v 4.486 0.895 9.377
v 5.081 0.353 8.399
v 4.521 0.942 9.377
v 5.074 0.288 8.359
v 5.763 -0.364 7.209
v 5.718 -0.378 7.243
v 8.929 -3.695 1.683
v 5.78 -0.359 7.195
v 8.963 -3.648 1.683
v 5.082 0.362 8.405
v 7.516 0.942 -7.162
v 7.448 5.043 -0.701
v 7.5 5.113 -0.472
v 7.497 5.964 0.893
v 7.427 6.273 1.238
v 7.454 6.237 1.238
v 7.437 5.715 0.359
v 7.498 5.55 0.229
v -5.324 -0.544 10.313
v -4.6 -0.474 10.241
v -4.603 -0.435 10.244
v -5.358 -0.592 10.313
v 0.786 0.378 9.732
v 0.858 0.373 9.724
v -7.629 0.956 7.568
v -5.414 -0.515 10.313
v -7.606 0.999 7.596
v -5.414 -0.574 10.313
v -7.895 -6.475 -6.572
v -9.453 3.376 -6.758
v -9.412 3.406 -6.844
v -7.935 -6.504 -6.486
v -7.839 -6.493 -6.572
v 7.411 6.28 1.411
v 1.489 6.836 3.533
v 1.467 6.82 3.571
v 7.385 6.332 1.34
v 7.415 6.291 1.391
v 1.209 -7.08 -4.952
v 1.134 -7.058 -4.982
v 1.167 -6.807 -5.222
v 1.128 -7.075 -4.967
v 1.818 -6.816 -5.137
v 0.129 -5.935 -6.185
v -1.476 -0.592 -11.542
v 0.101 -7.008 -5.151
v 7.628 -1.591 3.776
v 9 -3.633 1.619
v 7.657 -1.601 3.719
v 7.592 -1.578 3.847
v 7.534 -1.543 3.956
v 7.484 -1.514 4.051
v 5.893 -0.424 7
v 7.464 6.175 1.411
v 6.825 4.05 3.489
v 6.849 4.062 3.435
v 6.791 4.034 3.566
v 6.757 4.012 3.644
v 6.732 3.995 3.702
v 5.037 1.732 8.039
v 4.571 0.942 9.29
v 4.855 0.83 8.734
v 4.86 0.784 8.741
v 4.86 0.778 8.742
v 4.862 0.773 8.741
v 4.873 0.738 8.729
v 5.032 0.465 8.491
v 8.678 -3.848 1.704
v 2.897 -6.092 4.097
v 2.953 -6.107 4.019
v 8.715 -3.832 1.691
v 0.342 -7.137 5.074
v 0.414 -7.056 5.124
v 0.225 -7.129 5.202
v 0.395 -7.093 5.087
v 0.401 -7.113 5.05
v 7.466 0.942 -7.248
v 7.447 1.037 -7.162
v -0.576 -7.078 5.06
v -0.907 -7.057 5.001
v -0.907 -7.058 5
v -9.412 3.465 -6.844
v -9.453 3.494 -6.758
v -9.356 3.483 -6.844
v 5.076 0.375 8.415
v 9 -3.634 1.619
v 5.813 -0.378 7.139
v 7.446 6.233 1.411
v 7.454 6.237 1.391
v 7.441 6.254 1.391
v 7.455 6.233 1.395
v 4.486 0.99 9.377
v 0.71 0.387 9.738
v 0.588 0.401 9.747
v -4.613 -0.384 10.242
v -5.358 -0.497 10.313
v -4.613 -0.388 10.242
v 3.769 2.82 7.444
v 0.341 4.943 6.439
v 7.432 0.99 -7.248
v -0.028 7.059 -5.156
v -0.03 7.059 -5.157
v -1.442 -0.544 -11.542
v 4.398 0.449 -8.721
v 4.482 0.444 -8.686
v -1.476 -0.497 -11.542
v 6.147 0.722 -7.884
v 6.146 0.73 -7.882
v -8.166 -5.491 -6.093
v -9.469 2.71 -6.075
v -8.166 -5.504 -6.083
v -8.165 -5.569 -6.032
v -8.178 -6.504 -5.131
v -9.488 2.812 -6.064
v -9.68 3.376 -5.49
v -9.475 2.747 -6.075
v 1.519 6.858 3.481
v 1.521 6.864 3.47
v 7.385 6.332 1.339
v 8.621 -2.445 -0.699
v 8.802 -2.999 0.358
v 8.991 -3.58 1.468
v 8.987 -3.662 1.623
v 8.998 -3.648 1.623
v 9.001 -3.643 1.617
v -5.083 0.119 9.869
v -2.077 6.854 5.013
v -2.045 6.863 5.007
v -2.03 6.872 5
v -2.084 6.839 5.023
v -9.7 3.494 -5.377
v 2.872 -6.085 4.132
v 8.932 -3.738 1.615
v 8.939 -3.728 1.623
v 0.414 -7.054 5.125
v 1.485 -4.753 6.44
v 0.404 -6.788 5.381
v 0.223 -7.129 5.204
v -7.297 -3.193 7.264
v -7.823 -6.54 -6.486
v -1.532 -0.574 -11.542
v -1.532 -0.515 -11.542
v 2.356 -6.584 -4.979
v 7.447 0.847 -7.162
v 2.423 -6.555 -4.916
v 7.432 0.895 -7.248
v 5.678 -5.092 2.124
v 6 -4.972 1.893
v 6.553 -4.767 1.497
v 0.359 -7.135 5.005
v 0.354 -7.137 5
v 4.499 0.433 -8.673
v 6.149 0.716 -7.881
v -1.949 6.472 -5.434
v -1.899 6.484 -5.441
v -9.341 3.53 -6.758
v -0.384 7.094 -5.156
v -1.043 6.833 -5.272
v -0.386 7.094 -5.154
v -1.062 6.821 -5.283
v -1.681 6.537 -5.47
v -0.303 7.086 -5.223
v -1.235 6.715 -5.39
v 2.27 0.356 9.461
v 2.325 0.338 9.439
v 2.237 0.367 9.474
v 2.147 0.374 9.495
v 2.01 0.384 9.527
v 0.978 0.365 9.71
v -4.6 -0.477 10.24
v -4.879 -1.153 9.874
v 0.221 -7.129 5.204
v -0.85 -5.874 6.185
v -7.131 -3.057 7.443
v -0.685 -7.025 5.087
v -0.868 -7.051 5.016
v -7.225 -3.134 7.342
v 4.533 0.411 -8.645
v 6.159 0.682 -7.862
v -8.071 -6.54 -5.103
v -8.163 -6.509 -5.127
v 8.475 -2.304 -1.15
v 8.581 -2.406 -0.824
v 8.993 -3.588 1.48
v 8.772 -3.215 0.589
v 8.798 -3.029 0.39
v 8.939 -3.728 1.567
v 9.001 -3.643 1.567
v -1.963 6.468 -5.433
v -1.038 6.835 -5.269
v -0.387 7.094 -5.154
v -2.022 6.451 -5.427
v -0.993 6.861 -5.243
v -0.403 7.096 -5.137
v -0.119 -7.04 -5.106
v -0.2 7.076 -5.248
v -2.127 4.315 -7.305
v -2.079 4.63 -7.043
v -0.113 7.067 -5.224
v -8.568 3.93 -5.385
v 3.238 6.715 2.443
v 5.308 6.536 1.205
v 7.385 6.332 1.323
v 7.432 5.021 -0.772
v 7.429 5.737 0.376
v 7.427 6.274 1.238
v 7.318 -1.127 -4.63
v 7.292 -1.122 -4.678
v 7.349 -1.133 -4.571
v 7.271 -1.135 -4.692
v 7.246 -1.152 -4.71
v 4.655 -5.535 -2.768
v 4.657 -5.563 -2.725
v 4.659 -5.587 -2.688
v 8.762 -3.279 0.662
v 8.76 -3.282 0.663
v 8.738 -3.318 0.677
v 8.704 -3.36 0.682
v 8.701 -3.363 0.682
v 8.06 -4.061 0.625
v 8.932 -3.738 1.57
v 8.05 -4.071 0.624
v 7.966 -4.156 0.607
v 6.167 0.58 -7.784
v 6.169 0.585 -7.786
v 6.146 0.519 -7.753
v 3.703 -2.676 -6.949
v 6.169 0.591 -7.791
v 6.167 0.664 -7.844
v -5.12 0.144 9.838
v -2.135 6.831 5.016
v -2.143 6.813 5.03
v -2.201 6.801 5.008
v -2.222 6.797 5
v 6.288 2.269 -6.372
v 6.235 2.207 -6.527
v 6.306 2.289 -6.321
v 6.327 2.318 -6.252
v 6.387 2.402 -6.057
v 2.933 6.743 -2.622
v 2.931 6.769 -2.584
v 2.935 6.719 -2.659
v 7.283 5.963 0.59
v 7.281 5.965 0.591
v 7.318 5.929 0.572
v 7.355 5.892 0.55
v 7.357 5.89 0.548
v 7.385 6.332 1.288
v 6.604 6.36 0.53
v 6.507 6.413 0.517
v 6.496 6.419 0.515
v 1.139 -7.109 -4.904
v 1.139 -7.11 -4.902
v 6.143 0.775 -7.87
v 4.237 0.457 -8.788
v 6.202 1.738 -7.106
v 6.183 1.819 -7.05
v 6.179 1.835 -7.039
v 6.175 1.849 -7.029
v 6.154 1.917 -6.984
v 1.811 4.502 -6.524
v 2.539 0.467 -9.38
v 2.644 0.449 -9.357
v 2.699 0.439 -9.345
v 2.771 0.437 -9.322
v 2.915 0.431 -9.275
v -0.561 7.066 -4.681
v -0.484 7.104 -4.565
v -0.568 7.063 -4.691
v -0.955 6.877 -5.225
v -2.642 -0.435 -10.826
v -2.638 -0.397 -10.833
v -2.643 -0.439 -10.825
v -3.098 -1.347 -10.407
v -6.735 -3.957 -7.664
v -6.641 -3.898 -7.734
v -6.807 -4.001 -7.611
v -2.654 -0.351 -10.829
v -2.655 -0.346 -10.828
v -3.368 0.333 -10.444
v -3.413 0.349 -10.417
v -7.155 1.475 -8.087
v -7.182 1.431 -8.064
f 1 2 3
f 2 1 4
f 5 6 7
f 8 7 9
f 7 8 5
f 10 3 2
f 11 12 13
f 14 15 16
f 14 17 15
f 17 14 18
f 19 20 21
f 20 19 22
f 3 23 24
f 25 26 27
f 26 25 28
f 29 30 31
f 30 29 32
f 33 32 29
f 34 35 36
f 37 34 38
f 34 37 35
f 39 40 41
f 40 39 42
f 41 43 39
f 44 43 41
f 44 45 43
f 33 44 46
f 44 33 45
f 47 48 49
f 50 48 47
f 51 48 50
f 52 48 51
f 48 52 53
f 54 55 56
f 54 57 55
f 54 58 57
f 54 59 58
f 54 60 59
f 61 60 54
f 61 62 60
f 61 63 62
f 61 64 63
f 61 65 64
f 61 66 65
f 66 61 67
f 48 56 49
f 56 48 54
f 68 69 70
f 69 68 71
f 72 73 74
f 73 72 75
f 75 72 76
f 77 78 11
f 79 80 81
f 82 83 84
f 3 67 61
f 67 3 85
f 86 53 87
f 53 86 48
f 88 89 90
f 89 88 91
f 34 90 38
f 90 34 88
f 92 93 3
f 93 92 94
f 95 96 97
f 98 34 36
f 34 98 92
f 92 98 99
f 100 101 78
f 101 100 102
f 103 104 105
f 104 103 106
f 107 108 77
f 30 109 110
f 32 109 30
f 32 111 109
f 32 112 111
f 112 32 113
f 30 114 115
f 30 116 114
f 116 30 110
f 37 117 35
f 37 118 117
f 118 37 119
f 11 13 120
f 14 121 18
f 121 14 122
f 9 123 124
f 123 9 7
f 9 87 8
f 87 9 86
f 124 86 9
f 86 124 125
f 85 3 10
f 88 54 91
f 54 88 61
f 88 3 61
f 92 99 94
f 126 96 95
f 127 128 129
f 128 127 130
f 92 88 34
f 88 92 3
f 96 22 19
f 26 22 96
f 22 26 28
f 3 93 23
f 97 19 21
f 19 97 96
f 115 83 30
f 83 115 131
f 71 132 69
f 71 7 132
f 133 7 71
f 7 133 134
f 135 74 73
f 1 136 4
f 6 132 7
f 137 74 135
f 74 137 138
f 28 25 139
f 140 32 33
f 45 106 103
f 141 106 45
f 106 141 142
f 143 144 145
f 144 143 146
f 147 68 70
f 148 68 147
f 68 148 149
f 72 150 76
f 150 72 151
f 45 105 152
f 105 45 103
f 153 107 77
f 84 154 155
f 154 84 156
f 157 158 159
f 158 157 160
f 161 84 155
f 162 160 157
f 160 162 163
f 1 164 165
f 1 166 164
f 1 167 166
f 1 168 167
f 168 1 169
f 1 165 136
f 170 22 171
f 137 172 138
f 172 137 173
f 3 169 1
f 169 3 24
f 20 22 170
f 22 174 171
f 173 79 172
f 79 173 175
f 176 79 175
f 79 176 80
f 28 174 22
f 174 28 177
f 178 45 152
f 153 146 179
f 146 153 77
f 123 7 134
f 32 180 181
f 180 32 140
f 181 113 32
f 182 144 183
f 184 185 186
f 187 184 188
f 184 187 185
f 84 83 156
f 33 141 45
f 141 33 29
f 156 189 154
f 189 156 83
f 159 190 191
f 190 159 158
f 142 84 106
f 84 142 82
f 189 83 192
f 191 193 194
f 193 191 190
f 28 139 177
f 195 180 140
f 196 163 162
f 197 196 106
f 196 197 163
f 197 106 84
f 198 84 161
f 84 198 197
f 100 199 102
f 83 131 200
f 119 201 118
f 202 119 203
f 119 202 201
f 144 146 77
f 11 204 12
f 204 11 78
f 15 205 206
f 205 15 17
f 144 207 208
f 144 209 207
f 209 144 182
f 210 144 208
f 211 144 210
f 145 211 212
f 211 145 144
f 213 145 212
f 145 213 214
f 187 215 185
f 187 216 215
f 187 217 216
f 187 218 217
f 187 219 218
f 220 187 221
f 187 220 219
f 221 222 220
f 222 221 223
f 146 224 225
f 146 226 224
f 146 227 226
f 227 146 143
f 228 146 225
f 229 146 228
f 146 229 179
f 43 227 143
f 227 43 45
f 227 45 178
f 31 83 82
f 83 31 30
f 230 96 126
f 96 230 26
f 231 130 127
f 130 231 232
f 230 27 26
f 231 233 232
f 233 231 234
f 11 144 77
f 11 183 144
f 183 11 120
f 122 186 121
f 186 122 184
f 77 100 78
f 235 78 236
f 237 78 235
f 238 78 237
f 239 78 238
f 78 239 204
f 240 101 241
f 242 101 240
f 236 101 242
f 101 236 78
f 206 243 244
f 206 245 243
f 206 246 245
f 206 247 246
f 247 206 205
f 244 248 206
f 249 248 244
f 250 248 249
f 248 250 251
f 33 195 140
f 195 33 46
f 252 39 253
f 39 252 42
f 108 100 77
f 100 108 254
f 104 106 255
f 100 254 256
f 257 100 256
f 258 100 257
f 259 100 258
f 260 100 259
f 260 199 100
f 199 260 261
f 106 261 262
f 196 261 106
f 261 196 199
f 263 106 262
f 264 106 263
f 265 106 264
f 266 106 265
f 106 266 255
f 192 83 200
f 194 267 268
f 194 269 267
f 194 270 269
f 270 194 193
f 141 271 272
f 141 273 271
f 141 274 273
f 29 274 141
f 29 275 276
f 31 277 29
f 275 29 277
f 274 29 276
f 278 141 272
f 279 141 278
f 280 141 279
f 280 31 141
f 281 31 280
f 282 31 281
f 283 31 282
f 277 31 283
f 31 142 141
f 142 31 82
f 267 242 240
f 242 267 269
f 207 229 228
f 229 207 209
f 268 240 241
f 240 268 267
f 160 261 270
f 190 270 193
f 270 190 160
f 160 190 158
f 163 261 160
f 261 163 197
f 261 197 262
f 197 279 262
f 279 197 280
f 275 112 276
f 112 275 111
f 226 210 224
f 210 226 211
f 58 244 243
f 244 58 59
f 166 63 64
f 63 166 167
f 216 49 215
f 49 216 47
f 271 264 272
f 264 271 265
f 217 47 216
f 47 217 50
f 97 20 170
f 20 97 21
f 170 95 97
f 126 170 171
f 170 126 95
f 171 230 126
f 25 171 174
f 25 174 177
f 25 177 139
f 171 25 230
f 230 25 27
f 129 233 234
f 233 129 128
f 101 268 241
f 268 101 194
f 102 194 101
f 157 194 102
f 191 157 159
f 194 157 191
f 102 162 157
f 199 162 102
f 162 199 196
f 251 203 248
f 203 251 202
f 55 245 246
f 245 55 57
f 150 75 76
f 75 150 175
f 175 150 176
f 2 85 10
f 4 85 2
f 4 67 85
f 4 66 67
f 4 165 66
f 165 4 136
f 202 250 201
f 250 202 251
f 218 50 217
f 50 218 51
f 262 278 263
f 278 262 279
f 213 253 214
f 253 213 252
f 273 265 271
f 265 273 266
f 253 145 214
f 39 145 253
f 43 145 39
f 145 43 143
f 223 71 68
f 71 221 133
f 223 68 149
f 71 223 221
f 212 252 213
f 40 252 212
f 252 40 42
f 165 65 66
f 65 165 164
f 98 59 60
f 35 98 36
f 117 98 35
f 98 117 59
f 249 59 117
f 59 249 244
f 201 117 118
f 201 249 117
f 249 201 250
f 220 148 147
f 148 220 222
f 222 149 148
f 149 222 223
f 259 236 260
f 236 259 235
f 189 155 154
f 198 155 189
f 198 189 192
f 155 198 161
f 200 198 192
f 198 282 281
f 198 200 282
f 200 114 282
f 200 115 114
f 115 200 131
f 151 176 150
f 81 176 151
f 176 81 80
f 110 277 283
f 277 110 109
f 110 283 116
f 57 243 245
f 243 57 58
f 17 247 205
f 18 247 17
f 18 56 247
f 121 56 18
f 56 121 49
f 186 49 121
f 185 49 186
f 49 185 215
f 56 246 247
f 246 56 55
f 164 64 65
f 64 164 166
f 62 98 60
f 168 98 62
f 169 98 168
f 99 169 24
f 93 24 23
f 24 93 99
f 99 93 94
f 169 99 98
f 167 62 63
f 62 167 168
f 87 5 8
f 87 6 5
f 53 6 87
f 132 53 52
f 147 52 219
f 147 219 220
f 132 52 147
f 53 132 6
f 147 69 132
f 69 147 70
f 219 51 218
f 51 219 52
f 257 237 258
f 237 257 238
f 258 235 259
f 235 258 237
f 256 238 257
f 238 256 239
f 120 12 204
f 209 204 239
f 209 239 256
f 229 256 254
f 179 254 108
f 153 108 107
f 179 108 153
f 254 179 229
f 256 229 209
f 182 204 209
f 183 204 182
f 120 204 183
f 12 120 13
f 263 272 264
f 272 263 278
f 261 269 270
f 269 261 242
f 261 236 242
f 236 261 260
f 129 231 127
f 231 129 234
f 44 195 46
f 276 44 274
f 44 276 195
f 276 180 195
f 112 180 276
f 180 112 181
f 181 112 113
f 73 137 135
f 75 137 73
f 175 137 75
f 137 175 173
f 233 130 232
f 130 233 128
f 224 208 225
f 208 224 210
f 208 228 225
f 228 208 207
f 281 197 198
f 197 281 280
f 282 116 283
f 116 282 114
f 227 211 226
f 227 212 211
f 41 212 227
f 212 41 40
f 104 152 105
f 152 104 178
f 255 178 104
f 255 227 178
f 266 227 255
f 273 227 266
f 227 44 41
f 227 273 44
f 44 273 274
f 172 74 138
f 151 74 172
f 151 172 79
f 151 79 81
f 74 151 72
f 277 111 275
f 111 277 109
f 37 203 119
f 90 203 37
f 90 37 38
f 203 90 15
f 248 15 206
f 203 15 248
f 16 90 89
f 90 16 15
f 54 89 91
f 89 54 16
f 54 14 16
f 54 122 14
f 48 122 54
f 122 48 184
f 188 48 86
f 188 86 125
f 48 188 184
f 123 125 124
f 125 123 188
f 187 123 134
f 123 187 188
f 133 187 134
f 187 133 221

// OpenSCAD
// Auto-generated OpenSCAD file

    inner_points = 10*[[0.09531931272834022, -0.708217768074746, 0.49999999999998035], [-0.1265027432556592, 0.7082076393294248, 0.5000000000000197], [0.09531931272830348, -0.7082177680747239, -0.5000000000000197], [-0.12650274325569594, 0.7082076393294469, -0.49999999999998035], [-0.9026819541698768, -0.6450238500956094, 0.5000000000000183], [-1.057403067527742, 0.34293433580159893, 0.5000000000000459], [-0.9026819541699135, -0.6450238500955873, -0.4999999999999816], [-1.0574030675277786, 0.3429343358016208, -0.4999999999999542], [-0.36429558422672353, -0.054614512027756246, 1.1012960420472895], [-0.36429558422680436, -0.054614512027707784, -1.1012960420472664], [0.5881683563647194, 0.09454795600494201, 0.8356590717223468], [0.5881683563646581, 0.09454795600497881, -0.835659071722387], [0.8901105540161008, -0.36426009223040756, -4.1278652498751285e-14], [0.7353894406582356, 0.6236980936668005, -1.3844723451608184e-14]];

    outer_points = 10*[[-0.02066955875502509, 0.7082734695712609, -0.5116521782007974], [0.19691489843267096, -0.7082734695712609, -0.47269409229648607], [-0.19691489843267096, 0.7082734695712609, 0.47269409229648607], [0.02066955875502509, -0.7082734695712609, 0.5116521782007974], [-0.9371950219503415, 0.34351113745696893, -0.6757543304875785], [-0.7854296381335247, -0.6445318169533729, -0.6485810252963166], [-1.1134403616279873, 0.34351113745696893, 0.308591940009705], [-0.9616749778111705, -0.6445318169533729, 0.33576524520096696], [-0.14917650894770007, -0.05441805639996789, -1.145519356688417], [-0.537373098980239, -0.05441805639996789, 1.022593946716898], [0.7416409844661176, 0.09422163776851929, -0.7161588615966802], [0.4470789505652881, 0.09422163776851929, 0.9289969197175875], [0.7395623441727243, 0.6232908947450454, 0.13241724022144047], [0.891327727989541, -0.36475205966529645, 0.15959054541270243]];

    // Convex hull for inner set (I)
    module inner_hull() {
        hull() {
            for (p = inner_points) {
                translate(p) sphere(r=0.1);
            }
        }
    }

    // Convex hull for outer set (O) minus inner hull (O \ I)
    module outer_minus_inner() {
        difference() {
            hull() {
                for (p = outer_points) {
                    translate(p) sphere(r=0.1);
                }
            }
            inner_hull(); // Subtract inner hull
        }
    }

    // Convex hull for outer set (O) minus all translated inner hulls
    module outer_minus_AllTranslationInner() {
        difference() {
            hull() {
                for (p = outer_points) {
                    translate(p) sphere(r=0.1);
                }
            }
            hull() {
                translate([0,0,50]) inner_hull();
                translate([0,0,-50]) inner_hull();
            }; // Subtract translated inner hulls
        }
    }

    // Difference between outer_minus_inner and outer_minus_AllTranslationInner
    module outer_minus_inner_diff() {
        difference() {
            // Outer minus inner
            difference() {
                hull() {
                    for (p = outer_points) {
                        translate(p) sphere(r=0.1);
                    }
                }
                inner_hull();
            }

            // Subtract Outer minus AllTranslationInner
            difference() {
                hull() {
                    for (p = outer_points) {
                        translate(p) sphere(r=0.1);
                    }
                }
                hull() {
                    translate([0,0,50]) inner_hull();
                    translate([0,0,-50]) inner_hull();
                };
            }
        }
    }

    // Rendering all with colors applied
    color([1, 1, 0, 1]) outer_minus_inner_diff(); // Opaque yellow
    
